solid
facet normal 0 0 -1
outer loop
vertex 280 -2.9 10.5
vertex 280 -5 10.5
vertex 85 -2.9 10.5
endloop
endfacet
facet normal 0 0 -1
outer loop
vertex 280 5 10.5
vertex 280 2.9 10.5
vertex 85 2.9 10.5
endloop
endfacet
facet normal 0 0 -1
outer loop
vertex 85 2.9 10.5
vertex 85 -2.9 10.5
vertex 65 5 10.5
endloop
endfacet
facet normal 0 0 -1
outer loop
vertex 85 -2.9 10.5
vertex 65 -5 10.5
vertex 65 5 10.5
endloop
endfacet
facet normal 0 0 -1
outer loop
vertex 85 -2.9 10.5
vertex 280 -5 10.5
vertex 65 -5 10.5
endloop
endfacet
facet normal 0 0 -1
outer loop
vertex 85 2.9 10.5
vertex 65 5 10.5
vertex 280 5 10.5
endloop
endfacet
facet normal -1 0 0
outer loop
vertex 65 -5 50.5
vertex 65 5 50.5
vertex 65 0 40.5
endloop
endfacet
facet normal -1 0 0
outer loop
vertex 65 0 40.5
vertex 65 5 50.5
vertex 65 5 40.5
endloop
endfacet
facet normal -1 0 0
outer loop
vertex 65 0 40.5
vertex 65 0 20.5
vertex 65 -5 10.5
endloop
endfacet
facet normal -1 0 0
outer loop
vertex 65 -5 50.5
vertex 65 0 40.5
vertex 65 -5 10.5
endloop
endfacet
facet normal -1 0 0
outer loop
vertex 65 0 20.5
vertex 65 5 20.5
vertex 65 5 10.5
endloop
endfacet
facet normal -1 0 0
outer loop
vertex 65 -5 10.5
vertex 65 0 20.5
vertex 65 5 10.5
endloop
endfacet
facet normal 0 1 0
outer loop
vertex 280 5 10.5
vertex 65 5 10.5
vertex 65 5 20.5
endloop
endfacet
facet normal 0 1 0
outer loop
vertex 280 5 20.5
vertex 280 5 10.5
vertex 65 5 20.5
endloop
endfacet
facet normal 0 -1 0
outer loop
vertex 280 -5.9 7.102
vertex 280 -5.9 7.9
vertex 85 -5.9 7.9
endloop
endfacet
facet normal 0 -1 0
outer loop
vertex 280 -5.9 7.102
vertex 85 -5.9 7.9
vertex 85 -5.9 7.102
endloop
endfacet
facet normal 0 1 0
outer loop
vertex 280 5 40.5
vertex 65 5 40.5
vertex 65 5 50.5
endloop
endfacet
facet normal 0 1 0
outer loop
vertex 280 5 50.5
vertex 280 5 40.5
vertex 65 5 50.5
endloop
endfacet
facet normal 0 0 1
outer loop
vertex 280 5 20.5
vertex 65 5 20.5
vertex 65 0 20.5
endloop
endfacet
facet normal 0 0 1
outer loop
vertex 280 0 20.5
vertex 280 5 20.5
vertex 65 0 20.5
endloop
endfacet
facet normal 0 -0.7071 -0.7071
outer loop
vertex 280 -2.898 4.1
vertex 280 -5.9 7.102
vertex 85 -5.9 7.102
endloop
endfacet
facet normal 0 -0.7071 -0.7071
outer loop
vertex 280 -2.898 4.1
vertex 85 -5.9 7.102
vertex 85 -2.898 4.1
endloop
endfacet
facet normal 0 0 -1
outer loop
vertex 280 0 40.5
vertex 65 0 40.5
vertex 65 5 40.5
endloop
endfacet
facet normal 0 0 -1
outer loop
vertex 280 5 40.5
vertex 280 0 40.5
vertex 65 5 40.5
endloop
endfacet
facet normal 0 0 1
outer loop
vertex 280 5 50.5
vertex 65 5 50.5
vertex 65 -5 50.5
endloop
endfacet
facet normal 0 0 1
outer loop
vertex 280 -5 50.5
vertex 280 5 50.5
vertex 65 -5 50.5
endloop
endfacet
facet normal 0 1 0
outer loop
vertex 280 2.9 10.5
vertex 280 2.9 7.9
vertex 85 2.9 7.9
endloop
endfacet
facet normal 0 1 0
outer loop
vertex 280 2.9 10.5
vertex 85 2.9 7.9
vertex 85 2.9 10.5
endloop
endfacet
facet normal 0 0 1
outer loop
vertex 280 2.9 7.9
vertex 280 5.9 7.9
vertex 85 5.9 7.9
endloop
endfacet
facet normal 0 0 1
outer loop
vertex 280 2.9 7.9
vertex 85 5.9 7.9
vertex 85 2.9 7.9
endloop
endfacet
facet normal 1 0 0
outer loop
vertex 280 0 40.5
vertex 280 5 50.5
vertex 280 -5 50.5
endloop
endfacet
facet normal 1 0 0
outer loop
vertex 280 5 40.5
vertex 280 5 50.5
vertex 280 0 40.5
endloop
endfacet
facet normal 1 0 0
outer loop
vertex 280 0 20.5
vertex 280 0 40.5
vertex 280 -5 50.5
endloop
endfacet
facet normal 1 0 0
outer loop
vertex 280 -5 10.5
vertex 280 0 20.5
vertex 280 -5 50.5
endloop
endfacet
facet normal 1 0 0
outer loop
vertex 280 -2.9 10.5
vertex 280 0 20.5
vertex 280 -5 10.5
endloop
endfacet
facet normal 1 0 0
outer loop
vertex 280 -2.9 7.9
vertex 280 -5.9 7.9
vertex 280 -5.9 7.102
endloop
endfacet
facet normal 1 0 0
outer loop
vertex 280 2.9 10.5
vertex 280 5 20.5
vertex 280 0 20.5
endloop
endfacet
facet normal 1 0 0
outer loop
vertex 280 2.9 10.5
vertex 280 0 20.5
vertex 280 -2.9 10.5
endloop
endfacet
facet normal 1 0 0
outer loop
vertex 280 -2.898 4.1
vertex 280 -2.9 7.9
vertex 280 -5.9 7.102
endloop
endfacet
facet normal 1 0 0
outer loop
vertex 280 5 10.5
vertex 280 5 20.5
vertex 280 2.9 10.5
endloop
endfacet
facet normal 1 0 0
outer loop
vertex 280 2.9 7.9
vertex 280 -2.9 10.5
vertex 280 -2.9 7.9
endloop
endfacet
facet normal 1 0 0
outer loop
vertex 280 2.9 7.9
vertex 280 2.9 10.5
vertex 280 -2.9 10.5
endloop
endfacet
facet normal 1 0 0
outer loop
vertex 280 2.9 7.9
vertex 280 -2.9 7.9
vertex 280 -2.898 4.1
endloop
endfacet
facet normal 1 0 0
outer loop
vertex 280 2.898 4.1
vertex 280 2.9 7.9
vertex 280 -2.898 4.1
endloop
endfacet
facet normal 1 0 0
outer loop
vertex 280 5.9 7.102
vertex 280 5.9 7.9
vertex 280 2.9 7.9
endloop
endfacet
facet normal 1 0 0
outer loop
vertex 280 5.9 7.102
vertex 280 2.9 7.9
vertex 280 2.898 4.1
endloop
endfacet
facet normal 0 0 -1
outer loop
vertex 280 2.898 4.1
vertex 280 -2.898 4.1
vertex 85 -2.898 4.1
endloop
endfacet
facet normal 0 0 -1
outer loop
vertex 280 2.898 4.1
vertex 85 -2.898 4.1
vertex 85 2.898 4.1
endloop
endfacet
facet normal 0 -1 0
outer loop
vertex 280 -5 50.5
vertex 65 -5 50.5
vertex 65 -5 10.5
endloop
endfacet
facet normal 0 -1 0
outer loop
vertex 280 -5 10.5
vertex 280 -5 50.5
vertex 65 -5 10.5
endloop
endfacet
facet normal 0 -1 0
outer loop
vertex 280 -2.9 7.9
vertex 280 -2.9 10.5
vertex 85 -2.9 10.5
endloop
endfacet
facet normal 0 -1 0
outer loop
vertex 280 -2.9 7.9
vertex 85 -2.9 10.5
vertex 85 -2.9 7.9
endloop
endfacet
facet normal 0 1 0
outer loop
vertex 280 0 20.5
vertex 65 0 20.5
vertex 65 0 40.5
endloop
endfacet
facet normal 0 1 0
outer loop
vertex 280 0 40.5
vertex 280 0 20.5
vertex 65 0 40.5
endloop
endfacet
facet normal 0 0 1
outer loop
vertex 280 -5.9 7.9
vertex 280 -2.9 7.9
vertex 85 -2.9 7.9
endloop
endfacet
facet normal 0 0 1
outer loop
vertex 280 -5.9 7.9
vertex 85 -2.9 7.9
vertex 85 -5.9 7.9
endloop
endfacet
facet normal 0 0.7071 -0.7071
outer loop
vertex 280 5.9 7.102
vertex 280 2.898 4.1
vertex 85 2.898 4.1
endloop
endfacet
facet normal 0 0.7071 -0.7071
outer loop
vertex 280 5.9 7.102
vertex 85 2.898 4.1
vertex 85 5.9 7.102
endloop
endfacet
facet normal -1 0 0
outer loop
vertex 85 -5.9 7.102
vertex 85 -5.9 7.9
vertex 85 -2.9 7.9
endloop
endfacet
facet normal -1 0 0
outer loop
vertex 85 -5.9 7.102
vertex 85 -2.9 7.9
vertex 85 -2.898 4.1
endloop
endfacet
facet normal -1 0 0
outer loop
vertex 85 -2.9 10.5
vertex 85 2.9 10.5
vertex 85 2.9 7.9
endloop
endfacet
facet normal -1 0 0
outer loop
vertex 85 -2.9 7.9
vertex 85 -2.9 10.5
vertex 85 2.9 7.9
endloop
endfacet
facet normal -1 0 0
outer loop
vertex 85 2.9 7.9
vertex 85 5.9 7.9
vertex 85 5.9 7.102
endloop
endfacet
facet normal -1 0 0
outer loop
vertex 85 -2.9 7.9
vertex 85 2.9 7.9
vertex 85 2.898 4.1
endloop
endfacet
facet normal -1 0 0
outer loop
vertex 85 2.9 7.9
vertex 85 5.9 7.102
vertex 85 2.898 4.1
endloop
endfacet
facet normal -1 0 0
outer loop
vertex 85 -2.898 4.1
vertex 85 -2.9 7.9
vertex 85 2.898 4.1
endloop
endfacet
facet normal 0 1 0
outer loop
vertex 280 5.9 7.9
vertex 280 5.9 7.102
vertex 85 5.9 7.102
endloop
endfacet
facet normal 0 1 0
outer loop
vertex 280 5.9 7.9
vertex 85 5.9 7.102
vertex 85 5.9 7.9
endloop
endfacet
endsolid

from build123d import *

# Parameters (mm, degrees)
SKETCH1_R           = 2.1
BOSS_EXTRUDE1_DEPTH = 65
SKETCH84_W          = 0.3
SKETCH84_H          = 5.4
BOSS_EXTRUDE6_DEPTH = 430
SKETCH85_W          = 26.589814492
SKETCH85_H          = 26.977421118
CUT_EXTRUDE59_DEPTH = 434.070721707
SKETCH86_W          = 10.5
SKETCH86_H          = 16.670499862
CUT_EXTRUDE60_DEPTH = 20
SKETCH88_W          = 63.871976351
SKETCH88_H          = 27.184970046
CUT_EXTRUDE62_DEPTH = 215
BOSS_EXTRUDE7_DEPTH = 195


with BuildPart() as part:
    # Sketch1 → Boss-Extrude1 (new body)
    with BuildSketch(Plane(origin=(0, 0, 0), x_dir=(0, 0, -1), z_dir=(1, 0, 0))):
        with BuildLine():
            Line((-10, 9), (-10, 3))
            Line((-10, 3), (-8, 3))
            Line((-8, 3), (-8, 6))
            Line((-8, 6), (-7.060660172, 6))
            Line((-7.060660172, 6), (-4, 2.939339828))
            Line((-4, 2.939339828), (-4, -2.939339828))
            Line((-4, -2.939339828), (-7.060660172, -6))
            Line((-7.060660172, -6), (-8, -6))
            Line((-8, -6), (-8, -3))
            Line((-8, -3), (-10, -3))
            Line((-10, -3), (-10, -9))
            ThreePointArc((-10, -9), (-9.707106781, -9.707106781), (-9, -10))
            Line((-9, -10), (-3, -10))
            Line((-3, -10), (-3, -8))
            Line((-3, -8), (-6, -8))
            Line((-6, -8), (-6, -7.060660172))
            Line((-6, -7.060660172), (-2.939339828, -4))
            Line((-2.939339828, -4), (2.939339828, -4))
            Line((2.939339828, -4), (6, -7.060660172))
            Line((6, -7.060660172), (6, -8))
            Line((6, -8), (3, -8))
            Line((3, -8), (3, -10))
            Line((3, -10), (9, -10))
            ThreePointArc((9, -10), (9.707106781, -9.707106781), (10, -9))
            Line((10, -9), (10, -3))
            Line((10, -3), (8, -3))
            Line((8, -3), (8, -6))
            Line((8, -6), (7.060660172, -6))
            Line((7.060660172, -6), (4, -2.939339828))
            Line((4, -2.939339828), (4, 2.939339828))
            Line((4, 2.939339828), (7.060660172, 6))
            Line((7.060660172, 6), (8, 6))
            Line((8, 6), (8, 3))
            Line((8, 3), (10, 3))
            Line((10, 3), (10, 9))
            ThreePointArc((10, 9), (9.707106781, 9.707106781), (9, 10))
            Line((9, 10), (3, 10))
            Line((3, 10), (3, 8))
            Line((3, 8), (6, 8))
            Line((6, 8), (6, 7.060660172))
            Line((6, 7.060660172), (2.939339828, 4))
            Line((2.939339828, 4), (-2.939339828, 4))
            Line((-2.939339828, 4), (-6, 7.060660172))
            Line((-6, 7.060660172), (-6, 8))
            Line((-6, 8), (-3, 8))
            Line((-3, 8), (-3, 10))
            Line((-3, 10), (-9, 10))
            ThreePointArc((-9, 10), (-9.707106781, 9.707106781), (-10, 9))
        make_face()
        Circle(SKETCH1_R, mode=Mode.SUBTRACT)
    extrude(amount=BOSS_EXTRUDE1_DEPTH)

    # Sketch85 → Cut-Extrude59 (cut, through all)
    with BuildSketch(Plane(origin=(65, 0, 0), x_dir=(0, 0, -1), z_dir=(1, 0, 0))):
        with Locations((1.176321583, -0.814927094)):
            Rectangle(SKETCH85_W, SKETCH85_H)
    extrude(amount=-CUT_EXTRUDE59_DEPTH, mode=Mode.SUBTRACT)


with BuildPart() as body_2:
    # Sketch84 → Boss-Extrude6 (new body)
    with BuildSketch(Plane(origin=(65, 0, 0), x_dir=(0, 0, -1), z_dir=(1, 0, 0))):
        Polygon((-10, -2.7), (-10, 2.7), (-10.5, 2.7), (-10.5, 5), (-20.5, 5), (-20.5, 0), (-40.5, 0), (-40.5, 5), (-50.5, 5), (-50.5, -5), (-10.5, -5), (-10.5, -2.7), align=None)
        Polygon((-7.18492424, 5.7), (-4.3, 2.81507576), (-4.3, -2.81507576), (-7.18492424, -5.7), (-7.7, -5.7), (-7.7, -2.7), (-9.7, -2.7), (-9.7, 2.7), (-7.7, 2.7), (-7.7, 5.7), align=None)
        with Locations((-9.85, 0)):
            Rectangle(SKETCH84_W, SKETCH84_H)
    extrude(amount=BOSS_EXTRUDE6_DEPTH)

    # Sketch86 → Cut-Extrude60 (cut)
    with BuildSketch(Plane.ZY.offset(-65)):
        with Locations((5.25, -0.117074477)):
            Rectangle(SKETCH86_W, SKETCH86_H)
    extrude(amount=-CUT_EXTRUDE60_DEPTH, mode=Mode.SUBTRACT)

    # Sketch88 → Cut-Extrude62 (cut)
    with BuildSketch(Plane(origin=(495, 0, 0), x_dir=(0, 0, -1), z_dir=(1, 0, 0))):
        with Locations((-29.280082041, 0.441796331)):
            Rectangle(SKETCH88_W, SKETCH88_H)
    extrude(amount=-CUT_EXTRUDE62_DEPTH, mode=Mode.SUBTRACT)

    # Sketch89 → Boss-Extrude7 (add)
    with BuildSketch(Plane(origin=(280, 0, 0), x_dir=(0, 0, -1), z_dir=(1, 0, 0))):
        Polygon((-10.7, 2.9), (-10.7, -2.9), (-7.9, -2.9), (-7.9, -5.9), (-7.102081528, -5.9), (-4.1, -2.897918472), (-4.1, 2.897918472), (-7.102081528, 5.9), (-7.9, 5.9), (-7.9, 2.9), align=None)
        Polygon((-10.5, 2.7), (-10.5, -2.7), (-7.7, -2.7), (-7.7, -5.7), (-7.18492424, -5.7), (-4.3, -2.81507576), (-4.3, 2.81507576), (-7.18492424, 5.7), (-7.7, 5.7), (-7.7, 2.7), align=None, mode=Mode.SUBTRACT)
    extrude(amount=-BOSS_EXTRUDE7_DEPTH)


solid = body_2.part
